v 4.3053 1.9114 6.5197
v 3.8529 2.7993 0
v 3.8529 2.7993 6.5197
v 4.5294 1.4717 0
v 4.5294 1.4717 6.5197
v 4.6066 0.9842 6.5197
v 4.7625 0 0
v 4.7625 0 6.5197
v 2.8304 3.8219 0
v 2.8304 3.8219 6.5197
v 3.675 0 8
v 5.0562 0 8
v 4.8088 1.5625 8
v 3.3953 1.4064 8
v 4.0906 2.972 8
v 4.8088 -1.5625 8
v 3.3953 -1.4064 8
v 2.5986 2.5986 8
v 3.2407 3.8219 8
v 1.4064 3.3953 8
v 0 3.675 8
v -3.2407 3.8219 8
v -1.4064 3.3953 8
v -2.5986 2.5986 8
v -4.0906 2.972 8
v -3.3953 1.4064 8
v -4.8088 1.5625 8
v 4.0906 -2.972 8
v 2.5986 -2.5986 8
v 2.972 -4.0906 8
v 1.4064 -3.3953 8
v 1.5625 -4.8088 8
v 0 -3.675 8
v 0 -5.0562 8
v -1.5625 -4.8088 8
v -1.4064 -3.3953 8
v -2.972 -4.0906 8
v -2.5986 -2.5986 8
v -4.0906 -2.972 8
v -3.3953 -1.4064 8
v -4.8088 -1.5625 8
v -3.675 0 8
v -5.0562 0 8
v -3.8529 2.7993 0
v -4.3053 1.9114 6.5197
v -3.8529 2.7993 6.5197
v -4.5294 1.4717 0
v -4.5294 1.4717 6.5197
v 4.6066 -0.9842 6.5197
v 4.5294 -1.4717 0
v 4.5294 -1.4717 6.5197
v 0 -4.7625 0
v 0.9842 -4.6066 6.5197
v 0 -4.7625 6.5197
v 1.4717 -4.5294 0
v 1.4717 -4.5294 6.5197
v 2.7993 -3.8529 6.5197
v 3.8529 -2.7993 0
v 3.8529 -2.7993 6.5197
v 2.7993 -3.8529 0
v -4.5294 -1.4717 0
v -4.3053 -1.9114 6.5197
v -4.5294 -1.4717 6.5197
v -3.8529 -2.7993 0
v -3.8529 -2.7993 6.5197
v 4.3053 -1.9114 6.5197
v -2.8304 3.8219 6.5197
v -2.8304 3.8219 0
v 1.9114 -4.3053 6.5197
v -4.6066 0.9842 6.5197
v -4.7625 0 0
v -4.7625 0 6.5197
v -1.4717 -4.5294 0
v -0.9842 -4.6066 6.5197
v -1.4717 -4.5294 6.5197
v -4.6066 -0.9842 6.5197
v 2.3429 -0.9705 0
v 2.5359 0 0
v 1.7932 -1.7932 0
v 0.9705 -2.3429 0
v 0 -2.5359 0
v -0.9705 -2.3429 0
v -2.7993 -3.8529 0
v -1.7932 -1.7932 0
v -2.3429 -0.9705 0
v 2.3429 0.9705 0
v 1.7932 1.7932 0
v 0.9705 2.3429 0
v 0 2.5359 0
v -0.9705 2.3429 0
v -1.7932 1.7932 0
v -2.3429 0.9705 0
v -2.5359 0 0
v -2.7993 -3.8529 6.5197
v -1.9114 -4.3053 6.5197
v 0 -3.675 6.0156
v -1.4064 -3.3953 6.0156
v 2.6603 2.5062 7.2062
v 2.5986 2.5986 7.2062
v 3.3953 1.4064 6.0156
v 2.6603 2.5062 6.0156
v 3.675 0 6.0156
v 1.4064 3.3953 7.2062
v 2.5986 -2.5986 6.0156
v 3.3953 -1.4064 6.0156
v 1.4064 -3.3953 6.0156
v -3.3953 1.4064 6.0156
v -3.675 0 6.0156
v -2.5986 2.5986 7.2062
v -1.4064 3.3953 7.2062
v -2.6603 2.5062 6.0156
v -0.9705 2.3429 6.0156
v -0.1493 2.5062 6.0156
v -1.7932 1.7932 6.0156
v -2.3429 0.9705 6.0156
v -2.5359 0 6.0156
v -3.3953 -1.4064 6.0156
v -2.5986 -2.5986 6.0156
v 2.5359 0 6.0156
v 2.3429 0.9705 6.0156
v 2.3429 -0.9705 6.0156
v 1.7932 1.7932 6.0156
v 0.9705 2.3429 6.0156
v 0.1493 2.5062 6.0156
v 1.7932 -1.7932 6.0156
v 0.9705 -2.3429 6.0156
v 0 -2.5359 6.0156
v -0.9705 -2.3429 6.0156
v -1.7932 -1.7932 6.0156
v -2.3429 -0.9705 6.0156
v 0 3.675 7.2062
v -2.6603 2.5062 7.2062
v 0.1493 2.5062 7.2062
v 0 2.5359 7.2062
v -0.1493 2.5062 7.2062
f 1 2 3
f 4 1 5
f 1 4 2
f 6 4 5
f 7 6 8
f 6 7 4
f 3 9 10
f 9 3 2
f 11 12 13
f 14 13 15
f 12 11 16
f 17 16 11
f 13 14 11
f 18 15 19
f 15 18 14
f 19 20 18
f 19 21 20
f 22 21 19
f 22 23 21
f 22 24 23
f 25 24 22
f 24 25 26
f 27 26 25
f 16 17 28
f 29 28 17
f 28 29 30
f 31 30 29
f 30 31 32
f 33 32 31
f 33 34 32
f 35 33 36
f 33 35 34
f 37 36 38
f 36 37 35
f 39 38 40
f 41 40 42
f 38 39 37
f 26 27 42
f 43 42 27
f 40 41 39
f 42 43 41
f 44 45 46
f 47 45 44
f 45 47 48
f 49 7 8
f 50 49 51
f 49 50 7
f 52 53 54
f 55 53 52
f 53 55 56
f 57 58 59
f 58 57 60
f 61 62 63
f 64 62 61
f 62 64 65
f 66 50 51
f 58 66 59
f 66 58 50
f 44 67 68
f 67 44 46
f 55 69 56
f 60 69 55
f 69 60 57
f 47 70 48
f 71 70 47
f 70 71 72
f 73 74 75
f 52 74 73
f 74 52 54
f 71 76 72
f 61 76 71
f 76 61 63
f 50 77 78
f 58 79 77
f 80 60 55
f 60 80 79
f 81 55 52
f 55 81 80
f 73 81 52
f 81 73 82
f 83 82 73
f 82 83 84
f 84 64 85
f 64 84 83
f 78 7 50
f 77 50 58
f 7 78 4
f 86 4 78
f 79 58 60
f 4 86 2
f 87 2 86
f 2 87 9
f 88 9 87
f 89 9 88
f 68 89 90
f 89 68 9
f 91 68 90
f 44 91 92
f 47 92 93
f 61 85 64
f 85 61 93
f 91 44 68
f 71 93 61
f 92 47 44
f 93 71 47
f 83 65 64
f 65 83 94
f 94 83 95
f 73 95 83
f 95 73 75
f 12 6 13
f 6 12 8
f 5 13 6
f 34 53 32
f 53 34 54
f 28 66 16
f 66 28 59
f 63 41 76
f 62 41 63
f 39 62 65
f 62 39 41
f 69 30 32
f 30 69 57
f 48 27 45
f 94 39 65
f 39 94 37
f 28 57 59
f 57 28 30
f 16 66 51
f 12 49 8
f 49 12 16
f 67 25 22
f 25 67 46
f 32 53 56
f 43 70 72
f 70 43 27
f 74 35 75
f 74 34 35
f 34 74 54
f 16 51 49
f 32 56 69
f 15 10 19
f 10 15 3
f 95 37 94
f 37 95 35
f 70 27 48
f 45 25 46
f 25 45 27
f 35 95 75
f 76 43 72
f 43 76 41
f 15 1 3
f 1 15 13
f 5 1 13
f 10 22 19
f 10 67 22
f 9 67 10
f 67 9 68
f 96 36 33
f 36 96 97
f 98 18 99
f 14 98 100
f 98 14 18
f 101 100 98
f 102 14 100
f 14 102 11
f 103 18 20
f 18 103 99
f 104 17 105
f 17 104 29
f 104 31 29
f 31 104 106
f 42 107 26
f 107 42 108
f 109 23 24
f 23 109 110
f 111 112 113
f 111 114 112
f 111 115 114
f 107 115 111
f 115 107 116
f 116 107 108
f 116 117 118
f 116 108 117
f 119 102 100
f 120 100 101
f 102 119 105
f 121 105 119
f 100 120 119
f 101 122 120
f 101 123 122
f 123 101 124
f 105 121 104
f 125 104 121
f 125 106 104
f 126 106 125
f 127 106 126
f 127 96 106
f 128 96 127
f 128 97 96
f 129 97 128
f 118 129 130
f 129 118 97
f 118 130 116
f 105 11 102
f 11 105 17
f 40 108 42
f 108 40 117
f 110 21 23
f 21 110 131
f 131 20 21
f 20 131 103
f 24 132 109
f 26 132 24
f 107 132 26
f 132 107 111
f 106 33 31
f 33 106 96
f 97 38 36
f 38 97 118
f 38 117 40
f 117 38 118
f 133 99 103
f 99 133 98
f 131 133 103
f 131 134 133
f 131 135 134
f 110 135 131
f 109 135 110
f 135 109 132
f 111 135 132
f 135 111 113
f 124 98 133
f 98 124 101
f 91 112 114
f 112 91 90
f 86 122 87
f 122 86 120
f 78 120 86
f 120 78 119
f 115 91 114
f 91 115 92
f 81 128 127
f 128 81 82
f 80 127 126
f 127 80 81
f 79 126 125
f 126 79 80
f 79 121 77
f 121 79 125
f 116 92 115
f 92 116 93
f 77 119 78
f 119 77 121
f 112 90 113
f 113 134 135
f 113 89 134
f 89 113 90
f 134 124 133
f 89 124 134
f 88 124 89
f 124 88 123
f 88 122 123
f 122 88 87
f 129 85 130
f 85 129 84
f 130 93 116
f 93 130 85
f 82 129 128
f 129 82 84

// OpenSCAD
inch = 25.4; // conversion factor

$fn=16;

threadwidth = 0.4;
tgap = 2*threadwidth;

core_h = 8;
flange_h = 4;

module core_footprint(tolerance=0.25) {
  difference() {
    union() {
      cylinder(r=3/8*inch/2+tolerance, h=core_h, $fn=20);
      translate([0,0,core_h-flange_h]) cylinder(h=flange_h, r1=3/8*inch/2+tolerance-0.5, r2=7/16*inch/2-0.5+tolerance, $fn=20);
    }

    translate([-1*inch,9/64*inch+0.25,-1]) cube([2*inch,2*inch,core_h+2]);
  }
}


module my_core() {

difference() {
  core_footprint(0);

  // hole
  translate([0,0,-1]) cylinder(r=9/64*inch/2+0.75, h=core_h+2);

  // central D
  translate([0,0,core_h-5/64*inch])
    difference() {
    cylinder(r=1/4*inch/2+0.5, h=5/64*inch + 1);
    translate([-1*inch, 3/32*inch+0.125, 0]) cube([2*inch, 2*inch, 3/64*inch]);
  }
}


}

my_core();
